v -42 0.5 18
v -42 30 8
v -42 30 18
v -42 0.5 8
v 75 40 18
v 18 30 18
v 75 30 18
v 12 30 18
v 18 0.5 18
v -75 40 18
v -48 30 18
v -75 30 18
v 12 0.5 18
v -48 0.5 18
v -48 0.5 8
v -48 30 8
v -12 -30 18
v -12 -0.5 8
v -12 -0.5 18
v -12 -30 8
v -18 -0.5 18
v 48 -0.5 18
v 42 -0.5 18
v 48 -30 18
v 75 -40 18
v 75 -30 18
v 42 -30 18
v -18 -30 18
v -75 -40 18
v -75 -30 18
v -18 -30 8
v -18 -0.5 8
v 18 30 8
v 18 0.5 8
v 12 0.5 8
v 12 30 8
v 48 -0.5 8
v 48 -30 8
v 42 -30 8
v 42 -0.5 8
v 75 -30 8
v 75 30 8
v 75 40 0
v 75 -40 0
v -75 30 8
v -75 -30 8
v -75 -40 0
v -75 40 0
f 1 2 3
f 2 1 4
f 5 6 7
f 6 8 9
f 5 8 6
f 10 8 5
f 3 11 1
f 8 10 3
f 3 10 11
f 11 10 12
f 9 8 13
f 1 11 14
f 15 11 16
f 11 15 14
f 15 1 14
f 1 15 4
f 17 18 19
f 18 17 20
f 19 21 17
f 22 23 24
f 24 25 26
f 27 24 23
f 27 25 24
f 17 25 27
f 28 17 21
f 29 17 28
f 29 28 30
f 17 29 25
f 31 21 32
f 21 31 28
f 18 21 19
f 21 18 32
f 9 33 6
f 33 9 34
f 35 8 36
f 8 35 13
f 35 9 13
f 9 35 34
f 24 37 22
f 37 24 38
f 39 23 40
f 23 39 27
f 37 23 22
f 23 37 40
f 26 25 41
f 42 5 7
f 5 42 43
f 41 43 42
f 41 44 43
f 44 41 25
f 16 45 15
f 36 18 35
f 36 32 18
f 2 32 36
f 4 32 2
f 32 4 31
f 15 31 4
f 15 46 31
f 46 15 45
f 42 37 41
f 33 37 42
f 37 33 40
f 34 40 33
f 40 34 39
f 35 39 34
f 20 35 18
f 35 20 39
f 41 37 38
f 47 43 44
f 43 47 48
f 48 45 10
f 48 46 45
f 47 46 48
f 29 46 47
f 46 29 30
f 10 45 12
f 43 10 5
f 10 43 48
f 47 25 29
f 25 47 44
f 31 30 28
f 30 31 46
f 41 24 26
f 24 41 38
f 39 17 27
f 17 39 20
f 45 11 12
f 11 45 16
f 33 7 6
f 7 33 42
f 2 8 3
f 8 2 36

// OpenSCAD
$fn = 32;

// ----------------------------------------------------------------------
// Rib frame 150 x 80 x 18
// 4 ribs at 30 mm pitch, staggered
// ----------------------------------------------------------------------

// --- parameters (mm) ---
frame = [150, 80, 8];  // base plate size (x, y, z)
seat_tol = 0.1;        // tolerance at the seating features
free_tol = 0.3;        // general tolerance on the free sizes
rail_w = 10;           // side rail width
ribs = 4;              // number of ribs
rib_t = 6;             // rib thickness
rib_h = 10;            // rib height above the base plate
pitch = 30;            // pitch between rib centres

// --- derived feature positions (mm) ---
span = (ribs - 1) * pitch;          // = 90   distance between the outer ribs
origin_x = -span / 2;               // = -45   X of the first rib
rib_len = frame[1] / 2 - rail_w + 0.5;  // = 30.5   length of a staggered rib
rib_y = 0.5 + rib_len / 2;          // = 15.75   Y of a staggered rib centre
row_offset = 2 * rib_y;             // = 31.5   distance between the two rows
feature_centers = [
  [origin_x + 0 * pitch, rib_y],
  [origin_x + 1 * pitch, -rib_y],
  [origin_x + 2 * pitch, rib_y],
  [origin_x + 3 * pitch, -rib_y]
];   // rib centre line, drives the rib loop

// base plate, two side rails, then the ribs read straight off feature_centers
union() {
  translate([-frame[0] / 2, -frame[1] / 2, 0]) cube(frame);
  translate([-frame[0] / 2, -frame[1] / 2, 0]) cube([frame[0], rail_w, frame[2] + rib_h]);
  translate([-frame[0] / 2, frame[1] / 2 - rail_w, 0]) cube([frame[0], rail_w, frame[2] + rib_h]);
  for (centre = feature_centers)
    translate([centre[0] - rib_t / 2, centre[1] - rib_len / 2, frame[2] - 1])
      cube([rib_t, rib_len, rib_h + 1]);
}
